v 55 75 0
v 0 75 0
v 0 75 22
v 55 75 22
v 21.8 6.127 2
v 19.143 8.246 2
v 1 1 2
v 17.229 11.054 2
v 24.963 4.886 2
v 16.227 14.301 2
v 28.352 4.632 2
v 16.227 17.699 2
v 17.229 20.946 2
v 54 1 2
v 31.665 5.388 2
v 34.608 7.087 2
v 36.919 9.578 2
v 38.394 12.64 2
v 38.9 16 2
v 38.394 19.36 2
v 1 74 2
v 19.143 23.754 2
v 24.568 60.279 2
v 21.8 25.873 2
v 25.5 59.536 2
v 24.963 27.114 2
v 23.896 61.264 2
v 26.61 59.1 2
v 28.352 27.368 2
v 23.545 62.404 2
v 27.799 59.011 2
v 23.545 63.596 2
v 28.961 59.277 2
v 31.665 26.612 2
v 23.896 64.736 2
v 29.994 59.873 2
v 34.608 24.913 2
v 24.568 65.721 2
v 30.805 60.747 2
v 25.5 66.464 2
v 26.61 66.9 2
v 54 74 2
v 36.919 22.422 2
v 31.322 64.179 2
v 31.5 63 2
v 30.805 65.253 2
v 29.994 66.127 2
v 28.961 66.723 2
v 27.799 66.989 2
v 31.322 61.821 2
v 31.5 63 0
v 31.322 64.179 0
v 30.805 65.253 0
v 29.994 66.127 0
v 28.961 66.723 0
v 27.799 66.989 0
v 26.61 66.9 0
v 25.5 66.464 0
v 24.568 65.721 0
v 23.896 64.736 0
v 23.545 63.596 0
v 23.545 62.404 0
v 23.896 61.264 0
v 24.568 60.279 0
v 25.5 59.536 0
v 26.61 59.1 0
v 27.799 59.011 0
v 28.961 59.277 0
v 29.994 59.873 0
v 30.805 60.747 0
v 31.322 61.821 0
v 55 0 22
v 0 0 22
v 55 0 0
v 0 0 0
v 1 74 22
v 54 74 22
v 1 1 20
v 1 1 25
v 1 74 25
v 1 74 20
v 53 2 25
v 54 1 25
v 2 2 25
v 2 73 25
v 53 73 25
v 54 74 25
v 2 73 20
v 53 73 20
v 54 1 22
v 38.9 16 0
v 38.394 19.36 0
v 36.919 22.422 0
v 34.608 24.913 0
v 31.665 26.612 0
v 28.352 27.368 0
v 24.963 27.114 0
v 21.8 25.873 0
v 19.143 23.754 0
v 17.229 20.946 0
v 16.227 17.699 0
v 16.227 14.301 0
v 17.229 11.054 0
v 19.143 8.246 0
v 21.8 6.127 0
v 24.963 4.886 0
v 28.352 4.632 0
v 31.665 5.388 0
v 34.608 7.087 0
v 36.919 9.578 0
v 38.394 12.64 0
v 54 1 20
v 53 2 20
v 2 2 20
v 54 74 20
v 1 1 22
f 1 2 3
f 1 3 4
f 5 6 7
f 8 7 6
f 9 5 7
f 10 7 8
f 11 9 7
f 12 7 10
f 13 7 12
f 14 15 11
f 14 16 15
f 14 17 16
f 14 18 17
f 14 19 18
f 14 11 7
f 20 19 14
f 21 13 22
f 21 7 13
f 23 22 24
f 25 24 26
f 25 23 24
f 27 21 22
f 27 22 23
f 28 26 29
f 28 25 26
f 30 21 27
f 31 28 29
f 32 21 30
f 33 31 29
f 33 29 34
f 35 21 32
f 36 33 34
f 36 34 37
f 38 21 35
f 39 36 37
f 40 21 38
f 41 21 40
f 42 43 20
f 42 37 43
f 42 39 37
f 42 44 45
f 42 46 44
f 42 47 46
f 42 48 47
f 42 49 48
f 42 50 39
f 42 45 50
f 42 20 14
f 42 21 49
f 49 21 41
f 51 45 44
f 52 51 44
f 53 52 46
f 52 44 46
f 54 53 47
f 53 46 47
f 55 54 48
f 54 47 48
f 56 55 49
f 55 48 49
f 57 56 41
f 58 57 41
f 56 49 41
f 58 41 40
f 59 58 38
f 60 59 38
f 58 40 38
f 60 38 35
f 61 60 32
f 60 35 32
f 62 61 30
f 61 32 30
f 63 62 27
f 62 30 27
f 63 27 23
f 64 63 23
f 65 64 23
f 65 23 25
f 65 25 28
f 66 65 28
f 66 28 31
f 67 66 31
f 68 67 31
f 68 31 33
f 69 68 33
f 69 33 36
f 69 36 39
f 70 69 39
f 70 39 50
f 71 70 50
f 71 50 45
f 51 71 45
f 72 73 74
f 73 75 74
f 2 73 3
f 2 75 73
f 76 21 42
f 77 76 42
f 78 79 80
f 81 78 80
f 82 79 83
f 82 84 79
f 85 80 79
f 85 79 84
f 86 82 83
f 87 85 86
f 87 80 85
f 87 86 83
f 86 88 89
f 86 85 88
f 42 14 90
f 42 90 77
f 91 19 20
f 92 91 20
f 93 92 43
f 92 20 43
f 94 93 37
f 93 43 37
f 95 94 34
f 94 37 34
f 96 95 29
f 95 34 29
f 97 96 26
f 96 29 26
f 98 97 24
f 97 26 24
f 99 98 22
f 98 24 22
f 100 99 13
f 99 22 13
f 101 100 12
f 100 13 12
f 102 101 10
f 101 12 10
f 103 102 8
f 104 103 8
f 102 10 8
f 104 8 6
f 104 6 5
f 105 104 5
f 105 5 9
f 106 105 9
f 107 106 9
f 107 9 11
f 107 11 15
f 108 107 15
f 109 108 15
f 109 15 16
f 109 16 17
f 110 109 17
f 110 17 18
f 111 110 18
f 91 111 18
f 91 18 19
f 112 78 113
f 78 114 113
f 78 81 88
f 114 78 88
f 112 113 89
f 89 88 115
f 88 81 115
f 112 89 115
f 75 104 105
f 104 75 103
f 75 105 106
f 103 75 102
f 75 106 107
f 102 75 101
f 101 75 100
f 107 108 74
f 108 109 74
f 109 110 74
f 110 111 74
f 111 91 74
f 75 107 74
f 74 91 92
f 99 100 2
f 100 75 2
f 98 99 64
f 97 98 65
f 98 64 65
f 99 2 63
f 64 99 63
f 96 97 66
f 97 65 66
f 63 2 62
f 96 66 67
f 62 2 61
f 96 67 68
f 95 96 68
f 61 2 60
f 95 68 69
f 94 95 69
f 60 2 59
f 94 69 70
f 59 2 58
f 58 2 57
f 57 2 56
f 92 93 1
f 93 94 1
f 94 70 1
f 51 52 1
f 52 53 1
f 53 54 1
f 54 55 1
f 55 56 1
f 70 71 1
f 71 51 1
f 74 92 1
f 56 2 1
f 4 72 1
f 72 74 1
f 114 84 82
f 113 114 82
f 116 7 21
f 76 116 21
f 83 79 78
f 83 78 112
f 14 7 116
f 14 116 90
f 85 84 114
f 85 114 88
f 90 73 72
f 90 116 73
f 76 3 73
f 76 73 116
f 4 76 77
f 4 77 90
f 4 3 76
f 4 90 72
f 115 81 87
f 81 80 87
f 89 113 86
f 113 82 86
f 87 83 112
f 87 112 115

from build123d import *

# Parameters (mm, degrees)
SKETCH_1_W           = 55
SKETCH_1_H           = 75
EXTRUDE_1_DEPTH      = 2
SKETCH_2_W           = 55
SKETCH_2_H           = 75
SKETCH_2_W_2         = 53
SKETCH_2_H_2         = 73
EXTRUDE_2_DEPTH      = 20
SKETCH_3_W           = 53
SKETCH_3_H           = 73
SKETCH_3_W_2         = 51
SKETCH_3_H_2         = 71
EXTRUDE_3_DEPTH      = 3
EXTRUDE_3_DEPTH_BACK = 2
SKETCH_4_R           = 11.4
SKETCH_4_R_2         = 4
CUT_EXTRUDE_1_DEPTH  = 3


with BuildPart() as part:
    # Эскиз1 → Бобышка-Вытянуть1 (new body)
    with BuildSketch(Plane.XY):
        with Locations((27.5, 37.5)):
            Rectangle(SKETCH_1_W, SKETCH_1_H)
    extrude(amount=EXTRUDE_1_DEPTH)

    # Эскиз2 → Бобышка-Вытянуть2 (add)
    with BuildSketch(Plane.XY.offset(2)):
        with Locations((27.5, 37.5)):
            Rectangle(SKETCH_2_W, SKETCH_2_H)
        with Locations((27.5, 37.5)):
            Rectangle(SKETCH_2_W_2, SKETCH_2_H_2, mode=Mode.SUBTRACT)
    extrude(amount=EXTRUDE_2_DEPTH)

    # Эскиз4 → Вырез-Вытянуть1 (cut)
    with BuildSketch(Plane.XY.offset(2)):
        with Locations((27.5, 16)):
            Circle(SKETCH_4_R)
        with Locations((27.5, 63)):
            Circle(SKETCH_4_R_2)
    extrude(amount=-CUT_EXTRUDE_1_DEPTH, mode=Mode.SUBTRACT)


with BuildPart() as body_2:
    # Эскиз3 → Бобышка-Вытянуть3 (new body, two sides)
    with BuildSketch(Plane.XY.offset(22)) as extrude_3_sk:
        with Locations((27.5, 37.5)):
            Rectangle(SKETCH_3_W, SKETCH_3_H)
        with Locations((27.5, 37.5)):
            Rectangle(SKETCH_3_W_2, SKETCH_3_H_2, mode=Mode.SUBTRACT)
    extrude(amount=EXTRUDE_3_DEPTH)
    extrude(extrude_3_sk.sketch, amount=-EXTRUDE_3_DEPTH_BACK)


solid = Compound([part.part, body_2.part])
